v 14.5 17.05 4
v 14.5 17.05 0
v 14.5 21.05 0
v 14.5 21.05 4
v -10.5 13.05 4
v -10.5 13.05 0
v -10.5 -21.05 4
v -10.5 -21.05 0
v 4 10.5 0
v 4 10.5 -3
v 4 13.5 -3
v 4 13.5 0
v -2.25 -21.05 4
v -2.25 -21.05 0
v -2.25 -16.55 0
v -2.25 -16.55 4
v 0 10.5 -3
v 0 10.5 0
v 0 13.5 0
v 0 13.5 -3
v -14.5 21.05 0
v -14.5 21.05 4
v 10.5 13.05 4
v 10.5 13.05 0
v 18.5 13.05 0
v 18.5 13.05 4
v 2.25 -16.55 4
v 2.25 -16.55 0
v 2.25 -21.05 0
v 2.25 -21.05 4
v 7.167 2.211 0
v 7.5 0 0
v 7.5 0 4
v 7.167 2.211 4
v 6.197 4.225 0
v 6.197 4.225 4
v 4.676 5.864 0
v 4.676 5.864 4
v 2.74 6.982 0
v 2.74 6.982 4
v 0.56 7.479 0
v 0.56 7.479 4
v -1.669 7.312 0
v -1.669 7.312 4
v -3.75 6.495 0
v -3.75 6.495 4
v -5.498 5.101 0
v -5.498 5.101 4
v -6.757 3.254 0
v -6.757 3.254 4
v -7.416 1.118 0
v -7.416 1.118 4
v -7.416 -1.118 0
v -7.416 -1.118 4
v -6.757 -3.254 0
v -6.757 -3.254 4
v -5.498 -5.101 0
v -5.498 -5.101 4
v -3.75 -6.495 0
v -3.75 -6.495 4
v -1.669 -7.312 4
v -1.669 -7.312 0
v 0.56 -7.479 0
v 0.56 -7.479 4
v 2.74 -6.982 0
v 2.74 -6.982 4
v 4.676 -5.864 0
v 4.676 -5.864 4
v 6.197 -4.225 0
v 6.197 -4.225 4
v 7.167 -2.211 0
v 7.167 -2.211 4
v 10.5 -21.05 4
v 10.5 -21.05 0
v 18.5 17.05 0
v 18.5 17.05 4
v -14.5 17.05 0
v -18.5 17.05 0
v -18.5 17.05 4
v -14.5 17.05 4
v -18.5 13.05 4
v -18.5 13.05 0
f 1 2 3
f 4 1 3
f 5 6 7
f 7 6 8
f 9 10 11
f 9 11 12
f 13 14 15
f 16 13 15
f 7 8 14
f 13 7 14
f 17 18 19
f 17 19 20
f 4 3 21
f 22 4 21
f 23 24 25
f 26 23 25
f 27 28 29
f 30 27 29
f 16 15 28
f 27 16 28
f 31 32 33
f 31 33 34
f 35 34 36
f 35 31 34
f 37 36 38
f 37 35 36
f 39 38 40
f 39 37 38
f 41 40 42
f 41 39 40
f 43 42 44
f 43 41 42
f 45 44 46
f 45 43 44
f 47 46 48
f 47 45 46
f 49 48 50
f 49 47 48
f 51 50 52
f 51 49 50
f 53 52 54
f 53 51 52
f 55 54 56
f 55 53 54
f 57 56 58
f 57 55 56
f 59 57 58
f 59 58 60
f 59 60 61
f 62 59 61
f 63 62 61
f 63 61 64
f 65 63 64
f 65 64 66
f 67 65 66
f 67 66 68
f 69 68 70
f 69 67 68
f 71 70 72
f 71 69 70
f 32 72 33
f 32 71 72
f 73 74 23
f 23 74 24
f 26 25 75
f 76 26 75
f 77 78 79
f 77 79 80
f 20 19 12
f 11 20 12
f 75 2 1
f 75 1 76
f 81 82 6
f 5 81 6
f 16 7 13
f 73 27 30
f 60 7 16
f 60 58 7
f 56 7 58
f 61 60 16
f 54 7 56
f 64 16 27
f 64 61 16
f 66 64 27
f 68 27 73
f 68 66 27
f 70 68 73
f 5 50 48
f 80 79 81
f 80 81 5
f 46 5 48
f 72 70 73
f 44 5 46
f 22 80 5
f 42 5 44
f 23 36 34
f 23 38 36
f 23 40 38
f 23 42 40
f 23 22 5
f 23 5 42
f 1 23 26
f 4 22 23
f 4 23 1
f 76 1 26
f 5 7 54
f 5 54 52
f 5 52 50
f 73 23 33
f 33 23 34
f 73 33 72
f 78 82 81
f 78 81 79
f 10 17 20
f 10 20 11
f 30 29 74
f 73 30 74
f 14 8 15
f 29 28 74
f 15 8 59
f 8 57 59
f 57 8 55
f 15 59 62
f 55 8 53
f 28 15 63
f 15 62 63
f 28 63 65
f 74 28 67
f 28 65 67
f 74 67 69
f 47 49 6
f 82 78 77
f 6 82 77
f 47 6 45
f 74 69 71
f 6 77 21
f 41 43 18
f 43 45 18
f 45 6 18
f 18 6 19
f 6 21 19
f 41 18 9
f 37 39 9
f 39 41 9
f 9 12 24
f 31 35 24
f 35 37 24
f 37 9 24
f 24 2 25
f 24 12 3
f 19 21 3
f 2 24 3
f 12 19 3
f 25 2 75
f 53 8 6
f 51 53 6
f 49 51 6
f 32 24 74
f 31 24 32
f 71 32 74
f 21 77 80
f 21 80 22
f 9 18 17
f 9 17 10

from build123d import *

# Parameters (mm, degrees)
F0_R     = 7.5
F2_DEPTH = 4
F1_W     = 37
F1_H     = 4
F3_DEPTH = 4
F5_START = -10.5
F5_DEPTH = 3
F6_W     = 29
F6_H     = 8
F7_DEPTH = 4


with BuildPart() as f2:
    # F0 (on Top) → F2 (new body)
    with BuildSketch(Plane.XY):
        Polygon((10.5, 21.05), (-10.5, 21.05), (-10.5, -21.05), (-2.25, -21.05), (-2.25, -16.55), (2.25, -16.55), (2.25, -21.05), (10.5, -21.05), align=None)
        Circle(F0_R, mode=Mode.SUBTRACT)
    extrude(amount=F2_DEPTH)

    # F1 (on Top) → F3 (join)
    with BuildSketch(Plane.XY):
        with Locations((0, 15.05)):
            Rectangle(F1_W, F1_H)
    extrude(amount=F3_DEPTH)

    # F4 (on Front) → F5 (join)
    with BuildSketch(Plane.XZ.offset(F5_START)):
        Polygon((4, -2.9999939919), (4, 0), (2, 0), (0, 0), (0, -2.9999939919), align=None)
    extrude(amount=-F5_DEPTH)

    # F6 (on Top) → F7 (join)
    with BuildSketch(Plane.XY):
        with Locations((0, 17.05)):
            Rectangle(F6_W, F6_H)
    extrude(amount=F7_DEPTH)


solid = f2.part
